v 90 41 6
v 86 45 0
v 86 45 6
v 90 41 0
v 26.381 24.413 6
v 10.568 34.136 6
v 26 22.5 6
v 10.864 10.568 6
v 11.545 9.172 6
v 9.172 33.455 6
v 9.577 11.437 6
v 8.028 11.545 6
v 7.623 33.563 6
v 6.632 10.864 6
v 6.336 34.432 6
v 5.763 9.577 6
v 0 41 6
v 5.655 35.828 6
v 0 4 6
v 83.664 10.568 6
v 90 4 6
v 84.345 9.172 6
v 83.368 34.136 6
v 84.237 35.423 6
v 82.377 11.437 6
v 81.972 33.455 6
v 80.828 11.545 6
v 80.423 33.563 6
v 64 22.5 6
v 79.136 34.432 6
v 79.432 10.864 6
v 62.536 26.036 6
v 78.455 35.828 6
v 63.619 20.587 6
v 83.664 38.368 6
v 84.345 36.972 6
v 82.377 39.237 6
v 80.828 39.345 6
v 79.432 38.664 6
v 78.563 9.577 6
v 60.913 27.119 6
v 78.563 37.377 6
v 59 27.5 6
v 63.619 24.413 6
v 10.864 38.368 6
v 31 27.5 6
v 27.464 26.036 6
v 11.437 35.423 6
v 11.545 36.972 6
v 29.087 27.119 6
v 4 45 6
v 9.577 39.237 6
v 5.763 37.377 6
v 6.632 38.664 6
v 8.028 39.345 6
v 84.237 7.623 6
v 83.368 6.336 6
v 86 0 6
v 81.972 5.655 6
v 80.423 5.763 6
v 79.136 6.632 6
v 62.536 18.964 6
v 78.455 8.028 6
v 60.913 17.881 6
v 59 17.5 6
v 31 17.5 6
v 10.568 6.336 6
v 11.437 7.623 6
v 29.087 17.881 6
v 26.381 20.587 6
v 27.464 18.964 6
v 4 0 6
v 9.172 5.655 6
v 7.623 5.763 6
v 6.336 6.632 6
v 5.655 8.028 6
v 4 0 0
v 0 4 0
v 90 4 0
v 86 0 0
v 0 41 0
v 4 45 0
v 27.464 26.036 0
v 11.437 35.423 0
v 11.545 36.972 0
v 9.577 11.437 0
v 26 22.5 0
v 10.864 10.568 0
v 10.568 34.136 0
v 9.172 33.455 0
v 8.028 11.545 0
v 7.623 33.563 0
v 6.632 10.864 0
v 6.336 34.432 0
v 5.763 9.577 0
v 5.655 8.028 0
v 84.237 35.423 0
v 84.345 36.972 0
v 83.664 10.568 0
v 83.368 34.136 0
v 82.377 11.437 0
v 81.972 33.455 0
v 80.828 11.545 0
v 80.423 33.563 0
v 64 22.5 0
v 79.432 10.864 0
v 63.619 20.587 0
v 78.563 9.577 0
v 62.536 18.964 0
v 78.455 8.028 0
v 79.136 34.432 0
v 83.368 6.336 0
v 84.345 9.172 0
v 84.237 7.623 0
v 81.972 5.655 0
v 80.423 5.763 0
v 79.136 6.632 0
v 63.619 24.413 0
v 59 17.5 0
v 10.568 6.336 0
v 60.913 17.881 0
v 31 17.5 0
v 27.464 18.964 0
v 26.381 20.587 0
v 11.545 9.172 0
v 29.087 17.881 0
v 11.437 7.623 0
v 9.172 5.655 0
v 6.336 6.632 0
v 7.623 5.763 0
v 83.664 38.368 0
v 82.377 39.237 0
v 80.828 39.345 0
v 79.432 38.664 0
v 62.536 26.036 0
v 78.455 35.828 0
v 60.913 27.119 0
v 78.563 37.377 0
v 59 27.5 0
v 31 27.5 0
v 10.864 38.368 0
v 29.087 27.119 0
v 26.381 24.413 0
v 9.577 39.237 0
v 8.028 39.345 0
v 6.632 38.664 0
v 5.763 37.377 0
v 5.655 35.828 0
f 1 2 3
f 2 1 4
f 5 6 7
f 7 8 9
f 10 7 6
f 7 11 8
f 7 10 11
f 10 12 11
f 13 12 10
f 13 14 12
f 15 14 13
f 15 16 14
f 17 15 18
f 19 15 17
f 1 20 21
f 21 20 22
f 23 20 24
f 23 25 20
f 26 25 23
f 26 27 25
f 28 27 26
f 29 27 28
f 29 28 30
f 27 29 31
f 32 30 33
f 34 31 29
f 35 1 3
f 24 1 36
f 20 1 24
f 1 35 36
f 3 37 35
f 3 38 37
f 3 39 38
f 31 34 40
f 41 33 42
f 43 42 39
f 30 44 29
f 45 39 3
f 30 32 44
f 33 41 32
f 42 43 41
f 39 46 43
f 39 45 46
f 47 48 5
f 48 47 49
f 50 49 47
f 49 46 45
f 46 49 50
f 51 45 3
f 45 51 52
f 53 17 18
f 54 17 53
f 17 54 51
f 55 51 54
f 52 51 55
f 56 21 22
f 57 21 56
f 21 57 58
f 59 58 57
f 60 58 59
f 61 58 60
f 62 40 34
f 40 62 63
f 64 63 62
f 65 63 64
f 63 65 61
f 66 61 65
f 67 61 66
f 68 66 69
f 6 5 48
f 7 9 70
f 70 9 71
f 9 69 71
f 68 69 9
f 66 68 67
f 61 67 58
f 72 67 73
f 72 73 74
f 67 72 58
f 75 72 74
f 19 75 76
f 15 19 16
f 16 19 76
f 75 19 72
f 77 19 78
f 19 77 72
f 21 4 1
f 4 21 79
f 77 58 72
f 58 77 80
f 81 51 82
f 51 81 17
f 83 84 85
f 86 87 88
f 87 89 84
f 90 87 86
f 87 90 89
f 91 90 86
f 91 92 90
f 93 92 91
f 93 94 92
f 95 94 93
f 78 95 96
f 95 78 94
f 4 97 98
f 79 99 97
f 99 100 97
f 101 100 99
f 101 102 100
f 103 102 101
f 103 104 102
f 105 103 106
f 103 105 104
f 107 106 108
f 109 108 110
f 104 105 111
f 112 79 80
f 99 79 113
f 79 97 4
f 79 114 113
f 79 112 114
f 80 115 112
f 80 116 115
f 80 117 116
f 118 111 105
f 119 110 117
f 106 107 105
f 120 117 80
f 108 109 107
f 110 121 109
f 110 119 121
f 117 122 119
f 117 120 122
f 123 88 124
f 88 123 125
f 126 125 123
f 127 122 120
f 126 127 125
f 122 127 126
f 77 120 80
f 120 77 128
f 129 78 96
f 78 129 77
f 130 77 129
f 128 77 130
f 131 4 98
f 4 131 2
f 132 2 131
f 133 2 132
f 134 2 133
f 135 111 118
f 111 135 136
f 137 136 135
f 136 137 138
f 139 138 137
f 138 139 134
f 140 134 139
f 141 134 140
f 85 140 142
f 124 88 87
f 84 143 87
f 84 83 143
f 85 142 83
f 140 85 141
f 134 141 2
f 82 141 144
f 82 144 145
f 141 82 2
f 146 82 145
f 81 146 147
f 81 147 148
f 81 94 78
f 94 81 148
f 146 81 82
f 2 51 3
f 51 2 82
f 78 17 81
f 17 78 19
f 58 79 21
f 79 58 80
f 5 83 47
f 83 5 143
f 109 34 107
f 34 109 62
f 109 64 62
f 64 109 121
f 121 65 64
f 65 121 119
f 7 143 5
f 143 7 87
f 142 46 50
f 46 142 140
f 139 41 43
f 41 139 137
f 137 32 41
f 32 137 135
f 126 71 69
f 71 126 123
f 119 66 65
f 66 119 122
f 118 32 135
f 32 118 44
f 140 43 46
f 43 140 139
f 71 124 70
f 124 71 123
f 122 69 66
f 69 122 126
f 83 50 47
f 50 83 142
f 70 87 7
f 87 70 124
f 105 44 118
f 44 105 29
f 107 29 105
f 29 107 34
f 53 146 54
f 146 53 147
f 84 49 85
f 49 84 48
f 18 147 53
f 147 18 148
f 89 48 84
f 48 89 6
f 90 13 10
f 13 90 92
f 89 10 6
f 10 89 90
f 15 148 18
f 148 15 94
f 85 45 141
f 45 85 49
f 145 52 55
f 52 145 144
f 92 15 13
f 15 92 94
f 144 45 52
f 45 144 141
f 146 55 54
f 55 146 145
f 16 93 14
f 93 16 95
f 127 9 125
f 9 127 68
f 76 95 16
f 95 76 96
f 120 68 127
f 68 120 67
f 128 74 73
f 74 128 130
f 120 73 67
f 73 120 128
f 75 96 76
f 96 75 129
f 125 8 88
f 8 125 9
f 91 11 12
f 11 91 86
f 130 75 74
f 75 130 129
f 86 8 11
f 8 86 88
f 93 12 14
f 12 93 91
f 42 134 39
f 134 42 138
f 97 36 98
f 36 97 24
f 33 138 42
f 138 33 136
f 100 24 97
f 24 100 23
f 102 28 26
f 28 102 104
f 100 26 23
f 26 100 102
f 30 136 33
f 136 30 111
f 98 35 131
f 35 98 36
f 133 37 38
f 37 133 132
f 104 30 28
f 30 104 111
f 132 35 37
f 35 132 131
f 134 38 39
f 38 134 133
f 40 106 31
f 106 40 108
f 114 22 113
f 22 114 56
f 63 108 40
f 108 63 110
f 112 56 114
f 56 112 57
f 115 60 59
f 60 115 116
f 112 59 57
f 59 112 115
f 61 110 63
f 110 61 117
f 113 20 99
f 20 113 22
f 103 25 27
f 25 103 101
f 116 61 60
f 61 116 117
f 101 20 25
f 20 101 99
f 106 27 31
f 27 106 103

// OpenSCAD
$fn = 32;

// ----------------------------------------------------------------------
// Bracket plate: slot plate 90 x 45
// ----------------------------------------------------------------------

// --- parameters (mm) ---
hole_r = 3;               // bolt hole radius
plate_t = 6;              // plate thickness, Z (extrusion height)
plate_l = 90;             // plate length
plate_w = 45;             // plate width
slot_l = 28;              // slot straight length
slot_r = 5;               // slot end radius

slot_len = slot_l + 2 * slot_r;
slot_w = 2 * slot_r;
hole_d2 = 2 * hole_r;

profile = [[4, 0], [86, 0], [90, 4], [90, 41], [86, 45], [4, 45], [0, 41], [0, 4]];  // primary outline, 8 points, counter clockwise
void_1 = [[59, 17.5], [60.913, 17.881], [62.536, 18.964], [63.619, 20.587], [64, 22.5], [63.619, 24.413], [62.536, 26.036], [60.913, 27.119], [59, 27.5], [31, 27.5], [29.087, 27.119], [27.464, 26.036], [26.381, 24.413], [26, 22.5], [26.381, 20.587], [27.464, 18.964], [29.087, 17.881], [31, 17.5]];  // grip slot, 18 points
void_2 = [[11.545, 36.972], [10.864, 38.368], [9.577, 39.237], [8.028, 39.345], [6.632, 38.664], [5.763, 37.377], [5.655, 35.828], [6.336, 34.432], [7.623, 33.563], [9.172, 33.455], [10.568, 34.136], [11.437, 35.423]];  // corner hole, 12 points
void_3 = [[11.545, 9.172], [10.864, 10.568], [9.577, 11.437], [8.028, 11.545], [6.632, 10.864], [5.763, 9.577], [5.655, 8.028], [6.336, 6.632], [7.623, 5.763], [9.172, 5.655], [10.568, 6.336], [11.437, 7.623]];  // corner hole, 12 points
void_4 = [[84.345, 36.972], [83.664, 38.368], [82.377, 39.237], [80.828, 39.345], [79.432, 38.664], [78.563, 37.377], [78.455, 35.828], [79.136, 34.432], [80.423, 33.563], [81.972, 33.455], [83.368, 34.136], [84.237, 35.423]];  // corner hole, 12 points
void_5 = [[84.345, 9.172], [83.664, 10.568], [82.377, 11.437], [80.828, 11.545], [79.432, 10.864], [78.563, 9.577], [78.455, 8.028], [79.136, 6.632], [80.423, 5.763], [81.972, 5.655], [83.368, 6.336], [84.237, 7.623]];  // corner hole, 12 points

// --- the one profile operation ---
difference() {
  linear_extrude(height = plate_t) polygon(points = profile);
  translate([0, 0, -1])
    linear_extrude(height = plate_t + 2) polygon(points = void_1);
  translate([0, 0, -1])
    linear_extrude(height = plate_t + 2) polygon(points = void_2);
  translate([0, 0, -1])
    linear_extrude(height = plate_t + 2) polygon(points = void_3);
  translate([0, 0, -1])
    linear_extrude(height = plate_t + 2) polygon(points = void_4);
  translate([0, 0, -1])
    linear_extrude(height = plate_t + 2) polygon(points = void_5);
}
